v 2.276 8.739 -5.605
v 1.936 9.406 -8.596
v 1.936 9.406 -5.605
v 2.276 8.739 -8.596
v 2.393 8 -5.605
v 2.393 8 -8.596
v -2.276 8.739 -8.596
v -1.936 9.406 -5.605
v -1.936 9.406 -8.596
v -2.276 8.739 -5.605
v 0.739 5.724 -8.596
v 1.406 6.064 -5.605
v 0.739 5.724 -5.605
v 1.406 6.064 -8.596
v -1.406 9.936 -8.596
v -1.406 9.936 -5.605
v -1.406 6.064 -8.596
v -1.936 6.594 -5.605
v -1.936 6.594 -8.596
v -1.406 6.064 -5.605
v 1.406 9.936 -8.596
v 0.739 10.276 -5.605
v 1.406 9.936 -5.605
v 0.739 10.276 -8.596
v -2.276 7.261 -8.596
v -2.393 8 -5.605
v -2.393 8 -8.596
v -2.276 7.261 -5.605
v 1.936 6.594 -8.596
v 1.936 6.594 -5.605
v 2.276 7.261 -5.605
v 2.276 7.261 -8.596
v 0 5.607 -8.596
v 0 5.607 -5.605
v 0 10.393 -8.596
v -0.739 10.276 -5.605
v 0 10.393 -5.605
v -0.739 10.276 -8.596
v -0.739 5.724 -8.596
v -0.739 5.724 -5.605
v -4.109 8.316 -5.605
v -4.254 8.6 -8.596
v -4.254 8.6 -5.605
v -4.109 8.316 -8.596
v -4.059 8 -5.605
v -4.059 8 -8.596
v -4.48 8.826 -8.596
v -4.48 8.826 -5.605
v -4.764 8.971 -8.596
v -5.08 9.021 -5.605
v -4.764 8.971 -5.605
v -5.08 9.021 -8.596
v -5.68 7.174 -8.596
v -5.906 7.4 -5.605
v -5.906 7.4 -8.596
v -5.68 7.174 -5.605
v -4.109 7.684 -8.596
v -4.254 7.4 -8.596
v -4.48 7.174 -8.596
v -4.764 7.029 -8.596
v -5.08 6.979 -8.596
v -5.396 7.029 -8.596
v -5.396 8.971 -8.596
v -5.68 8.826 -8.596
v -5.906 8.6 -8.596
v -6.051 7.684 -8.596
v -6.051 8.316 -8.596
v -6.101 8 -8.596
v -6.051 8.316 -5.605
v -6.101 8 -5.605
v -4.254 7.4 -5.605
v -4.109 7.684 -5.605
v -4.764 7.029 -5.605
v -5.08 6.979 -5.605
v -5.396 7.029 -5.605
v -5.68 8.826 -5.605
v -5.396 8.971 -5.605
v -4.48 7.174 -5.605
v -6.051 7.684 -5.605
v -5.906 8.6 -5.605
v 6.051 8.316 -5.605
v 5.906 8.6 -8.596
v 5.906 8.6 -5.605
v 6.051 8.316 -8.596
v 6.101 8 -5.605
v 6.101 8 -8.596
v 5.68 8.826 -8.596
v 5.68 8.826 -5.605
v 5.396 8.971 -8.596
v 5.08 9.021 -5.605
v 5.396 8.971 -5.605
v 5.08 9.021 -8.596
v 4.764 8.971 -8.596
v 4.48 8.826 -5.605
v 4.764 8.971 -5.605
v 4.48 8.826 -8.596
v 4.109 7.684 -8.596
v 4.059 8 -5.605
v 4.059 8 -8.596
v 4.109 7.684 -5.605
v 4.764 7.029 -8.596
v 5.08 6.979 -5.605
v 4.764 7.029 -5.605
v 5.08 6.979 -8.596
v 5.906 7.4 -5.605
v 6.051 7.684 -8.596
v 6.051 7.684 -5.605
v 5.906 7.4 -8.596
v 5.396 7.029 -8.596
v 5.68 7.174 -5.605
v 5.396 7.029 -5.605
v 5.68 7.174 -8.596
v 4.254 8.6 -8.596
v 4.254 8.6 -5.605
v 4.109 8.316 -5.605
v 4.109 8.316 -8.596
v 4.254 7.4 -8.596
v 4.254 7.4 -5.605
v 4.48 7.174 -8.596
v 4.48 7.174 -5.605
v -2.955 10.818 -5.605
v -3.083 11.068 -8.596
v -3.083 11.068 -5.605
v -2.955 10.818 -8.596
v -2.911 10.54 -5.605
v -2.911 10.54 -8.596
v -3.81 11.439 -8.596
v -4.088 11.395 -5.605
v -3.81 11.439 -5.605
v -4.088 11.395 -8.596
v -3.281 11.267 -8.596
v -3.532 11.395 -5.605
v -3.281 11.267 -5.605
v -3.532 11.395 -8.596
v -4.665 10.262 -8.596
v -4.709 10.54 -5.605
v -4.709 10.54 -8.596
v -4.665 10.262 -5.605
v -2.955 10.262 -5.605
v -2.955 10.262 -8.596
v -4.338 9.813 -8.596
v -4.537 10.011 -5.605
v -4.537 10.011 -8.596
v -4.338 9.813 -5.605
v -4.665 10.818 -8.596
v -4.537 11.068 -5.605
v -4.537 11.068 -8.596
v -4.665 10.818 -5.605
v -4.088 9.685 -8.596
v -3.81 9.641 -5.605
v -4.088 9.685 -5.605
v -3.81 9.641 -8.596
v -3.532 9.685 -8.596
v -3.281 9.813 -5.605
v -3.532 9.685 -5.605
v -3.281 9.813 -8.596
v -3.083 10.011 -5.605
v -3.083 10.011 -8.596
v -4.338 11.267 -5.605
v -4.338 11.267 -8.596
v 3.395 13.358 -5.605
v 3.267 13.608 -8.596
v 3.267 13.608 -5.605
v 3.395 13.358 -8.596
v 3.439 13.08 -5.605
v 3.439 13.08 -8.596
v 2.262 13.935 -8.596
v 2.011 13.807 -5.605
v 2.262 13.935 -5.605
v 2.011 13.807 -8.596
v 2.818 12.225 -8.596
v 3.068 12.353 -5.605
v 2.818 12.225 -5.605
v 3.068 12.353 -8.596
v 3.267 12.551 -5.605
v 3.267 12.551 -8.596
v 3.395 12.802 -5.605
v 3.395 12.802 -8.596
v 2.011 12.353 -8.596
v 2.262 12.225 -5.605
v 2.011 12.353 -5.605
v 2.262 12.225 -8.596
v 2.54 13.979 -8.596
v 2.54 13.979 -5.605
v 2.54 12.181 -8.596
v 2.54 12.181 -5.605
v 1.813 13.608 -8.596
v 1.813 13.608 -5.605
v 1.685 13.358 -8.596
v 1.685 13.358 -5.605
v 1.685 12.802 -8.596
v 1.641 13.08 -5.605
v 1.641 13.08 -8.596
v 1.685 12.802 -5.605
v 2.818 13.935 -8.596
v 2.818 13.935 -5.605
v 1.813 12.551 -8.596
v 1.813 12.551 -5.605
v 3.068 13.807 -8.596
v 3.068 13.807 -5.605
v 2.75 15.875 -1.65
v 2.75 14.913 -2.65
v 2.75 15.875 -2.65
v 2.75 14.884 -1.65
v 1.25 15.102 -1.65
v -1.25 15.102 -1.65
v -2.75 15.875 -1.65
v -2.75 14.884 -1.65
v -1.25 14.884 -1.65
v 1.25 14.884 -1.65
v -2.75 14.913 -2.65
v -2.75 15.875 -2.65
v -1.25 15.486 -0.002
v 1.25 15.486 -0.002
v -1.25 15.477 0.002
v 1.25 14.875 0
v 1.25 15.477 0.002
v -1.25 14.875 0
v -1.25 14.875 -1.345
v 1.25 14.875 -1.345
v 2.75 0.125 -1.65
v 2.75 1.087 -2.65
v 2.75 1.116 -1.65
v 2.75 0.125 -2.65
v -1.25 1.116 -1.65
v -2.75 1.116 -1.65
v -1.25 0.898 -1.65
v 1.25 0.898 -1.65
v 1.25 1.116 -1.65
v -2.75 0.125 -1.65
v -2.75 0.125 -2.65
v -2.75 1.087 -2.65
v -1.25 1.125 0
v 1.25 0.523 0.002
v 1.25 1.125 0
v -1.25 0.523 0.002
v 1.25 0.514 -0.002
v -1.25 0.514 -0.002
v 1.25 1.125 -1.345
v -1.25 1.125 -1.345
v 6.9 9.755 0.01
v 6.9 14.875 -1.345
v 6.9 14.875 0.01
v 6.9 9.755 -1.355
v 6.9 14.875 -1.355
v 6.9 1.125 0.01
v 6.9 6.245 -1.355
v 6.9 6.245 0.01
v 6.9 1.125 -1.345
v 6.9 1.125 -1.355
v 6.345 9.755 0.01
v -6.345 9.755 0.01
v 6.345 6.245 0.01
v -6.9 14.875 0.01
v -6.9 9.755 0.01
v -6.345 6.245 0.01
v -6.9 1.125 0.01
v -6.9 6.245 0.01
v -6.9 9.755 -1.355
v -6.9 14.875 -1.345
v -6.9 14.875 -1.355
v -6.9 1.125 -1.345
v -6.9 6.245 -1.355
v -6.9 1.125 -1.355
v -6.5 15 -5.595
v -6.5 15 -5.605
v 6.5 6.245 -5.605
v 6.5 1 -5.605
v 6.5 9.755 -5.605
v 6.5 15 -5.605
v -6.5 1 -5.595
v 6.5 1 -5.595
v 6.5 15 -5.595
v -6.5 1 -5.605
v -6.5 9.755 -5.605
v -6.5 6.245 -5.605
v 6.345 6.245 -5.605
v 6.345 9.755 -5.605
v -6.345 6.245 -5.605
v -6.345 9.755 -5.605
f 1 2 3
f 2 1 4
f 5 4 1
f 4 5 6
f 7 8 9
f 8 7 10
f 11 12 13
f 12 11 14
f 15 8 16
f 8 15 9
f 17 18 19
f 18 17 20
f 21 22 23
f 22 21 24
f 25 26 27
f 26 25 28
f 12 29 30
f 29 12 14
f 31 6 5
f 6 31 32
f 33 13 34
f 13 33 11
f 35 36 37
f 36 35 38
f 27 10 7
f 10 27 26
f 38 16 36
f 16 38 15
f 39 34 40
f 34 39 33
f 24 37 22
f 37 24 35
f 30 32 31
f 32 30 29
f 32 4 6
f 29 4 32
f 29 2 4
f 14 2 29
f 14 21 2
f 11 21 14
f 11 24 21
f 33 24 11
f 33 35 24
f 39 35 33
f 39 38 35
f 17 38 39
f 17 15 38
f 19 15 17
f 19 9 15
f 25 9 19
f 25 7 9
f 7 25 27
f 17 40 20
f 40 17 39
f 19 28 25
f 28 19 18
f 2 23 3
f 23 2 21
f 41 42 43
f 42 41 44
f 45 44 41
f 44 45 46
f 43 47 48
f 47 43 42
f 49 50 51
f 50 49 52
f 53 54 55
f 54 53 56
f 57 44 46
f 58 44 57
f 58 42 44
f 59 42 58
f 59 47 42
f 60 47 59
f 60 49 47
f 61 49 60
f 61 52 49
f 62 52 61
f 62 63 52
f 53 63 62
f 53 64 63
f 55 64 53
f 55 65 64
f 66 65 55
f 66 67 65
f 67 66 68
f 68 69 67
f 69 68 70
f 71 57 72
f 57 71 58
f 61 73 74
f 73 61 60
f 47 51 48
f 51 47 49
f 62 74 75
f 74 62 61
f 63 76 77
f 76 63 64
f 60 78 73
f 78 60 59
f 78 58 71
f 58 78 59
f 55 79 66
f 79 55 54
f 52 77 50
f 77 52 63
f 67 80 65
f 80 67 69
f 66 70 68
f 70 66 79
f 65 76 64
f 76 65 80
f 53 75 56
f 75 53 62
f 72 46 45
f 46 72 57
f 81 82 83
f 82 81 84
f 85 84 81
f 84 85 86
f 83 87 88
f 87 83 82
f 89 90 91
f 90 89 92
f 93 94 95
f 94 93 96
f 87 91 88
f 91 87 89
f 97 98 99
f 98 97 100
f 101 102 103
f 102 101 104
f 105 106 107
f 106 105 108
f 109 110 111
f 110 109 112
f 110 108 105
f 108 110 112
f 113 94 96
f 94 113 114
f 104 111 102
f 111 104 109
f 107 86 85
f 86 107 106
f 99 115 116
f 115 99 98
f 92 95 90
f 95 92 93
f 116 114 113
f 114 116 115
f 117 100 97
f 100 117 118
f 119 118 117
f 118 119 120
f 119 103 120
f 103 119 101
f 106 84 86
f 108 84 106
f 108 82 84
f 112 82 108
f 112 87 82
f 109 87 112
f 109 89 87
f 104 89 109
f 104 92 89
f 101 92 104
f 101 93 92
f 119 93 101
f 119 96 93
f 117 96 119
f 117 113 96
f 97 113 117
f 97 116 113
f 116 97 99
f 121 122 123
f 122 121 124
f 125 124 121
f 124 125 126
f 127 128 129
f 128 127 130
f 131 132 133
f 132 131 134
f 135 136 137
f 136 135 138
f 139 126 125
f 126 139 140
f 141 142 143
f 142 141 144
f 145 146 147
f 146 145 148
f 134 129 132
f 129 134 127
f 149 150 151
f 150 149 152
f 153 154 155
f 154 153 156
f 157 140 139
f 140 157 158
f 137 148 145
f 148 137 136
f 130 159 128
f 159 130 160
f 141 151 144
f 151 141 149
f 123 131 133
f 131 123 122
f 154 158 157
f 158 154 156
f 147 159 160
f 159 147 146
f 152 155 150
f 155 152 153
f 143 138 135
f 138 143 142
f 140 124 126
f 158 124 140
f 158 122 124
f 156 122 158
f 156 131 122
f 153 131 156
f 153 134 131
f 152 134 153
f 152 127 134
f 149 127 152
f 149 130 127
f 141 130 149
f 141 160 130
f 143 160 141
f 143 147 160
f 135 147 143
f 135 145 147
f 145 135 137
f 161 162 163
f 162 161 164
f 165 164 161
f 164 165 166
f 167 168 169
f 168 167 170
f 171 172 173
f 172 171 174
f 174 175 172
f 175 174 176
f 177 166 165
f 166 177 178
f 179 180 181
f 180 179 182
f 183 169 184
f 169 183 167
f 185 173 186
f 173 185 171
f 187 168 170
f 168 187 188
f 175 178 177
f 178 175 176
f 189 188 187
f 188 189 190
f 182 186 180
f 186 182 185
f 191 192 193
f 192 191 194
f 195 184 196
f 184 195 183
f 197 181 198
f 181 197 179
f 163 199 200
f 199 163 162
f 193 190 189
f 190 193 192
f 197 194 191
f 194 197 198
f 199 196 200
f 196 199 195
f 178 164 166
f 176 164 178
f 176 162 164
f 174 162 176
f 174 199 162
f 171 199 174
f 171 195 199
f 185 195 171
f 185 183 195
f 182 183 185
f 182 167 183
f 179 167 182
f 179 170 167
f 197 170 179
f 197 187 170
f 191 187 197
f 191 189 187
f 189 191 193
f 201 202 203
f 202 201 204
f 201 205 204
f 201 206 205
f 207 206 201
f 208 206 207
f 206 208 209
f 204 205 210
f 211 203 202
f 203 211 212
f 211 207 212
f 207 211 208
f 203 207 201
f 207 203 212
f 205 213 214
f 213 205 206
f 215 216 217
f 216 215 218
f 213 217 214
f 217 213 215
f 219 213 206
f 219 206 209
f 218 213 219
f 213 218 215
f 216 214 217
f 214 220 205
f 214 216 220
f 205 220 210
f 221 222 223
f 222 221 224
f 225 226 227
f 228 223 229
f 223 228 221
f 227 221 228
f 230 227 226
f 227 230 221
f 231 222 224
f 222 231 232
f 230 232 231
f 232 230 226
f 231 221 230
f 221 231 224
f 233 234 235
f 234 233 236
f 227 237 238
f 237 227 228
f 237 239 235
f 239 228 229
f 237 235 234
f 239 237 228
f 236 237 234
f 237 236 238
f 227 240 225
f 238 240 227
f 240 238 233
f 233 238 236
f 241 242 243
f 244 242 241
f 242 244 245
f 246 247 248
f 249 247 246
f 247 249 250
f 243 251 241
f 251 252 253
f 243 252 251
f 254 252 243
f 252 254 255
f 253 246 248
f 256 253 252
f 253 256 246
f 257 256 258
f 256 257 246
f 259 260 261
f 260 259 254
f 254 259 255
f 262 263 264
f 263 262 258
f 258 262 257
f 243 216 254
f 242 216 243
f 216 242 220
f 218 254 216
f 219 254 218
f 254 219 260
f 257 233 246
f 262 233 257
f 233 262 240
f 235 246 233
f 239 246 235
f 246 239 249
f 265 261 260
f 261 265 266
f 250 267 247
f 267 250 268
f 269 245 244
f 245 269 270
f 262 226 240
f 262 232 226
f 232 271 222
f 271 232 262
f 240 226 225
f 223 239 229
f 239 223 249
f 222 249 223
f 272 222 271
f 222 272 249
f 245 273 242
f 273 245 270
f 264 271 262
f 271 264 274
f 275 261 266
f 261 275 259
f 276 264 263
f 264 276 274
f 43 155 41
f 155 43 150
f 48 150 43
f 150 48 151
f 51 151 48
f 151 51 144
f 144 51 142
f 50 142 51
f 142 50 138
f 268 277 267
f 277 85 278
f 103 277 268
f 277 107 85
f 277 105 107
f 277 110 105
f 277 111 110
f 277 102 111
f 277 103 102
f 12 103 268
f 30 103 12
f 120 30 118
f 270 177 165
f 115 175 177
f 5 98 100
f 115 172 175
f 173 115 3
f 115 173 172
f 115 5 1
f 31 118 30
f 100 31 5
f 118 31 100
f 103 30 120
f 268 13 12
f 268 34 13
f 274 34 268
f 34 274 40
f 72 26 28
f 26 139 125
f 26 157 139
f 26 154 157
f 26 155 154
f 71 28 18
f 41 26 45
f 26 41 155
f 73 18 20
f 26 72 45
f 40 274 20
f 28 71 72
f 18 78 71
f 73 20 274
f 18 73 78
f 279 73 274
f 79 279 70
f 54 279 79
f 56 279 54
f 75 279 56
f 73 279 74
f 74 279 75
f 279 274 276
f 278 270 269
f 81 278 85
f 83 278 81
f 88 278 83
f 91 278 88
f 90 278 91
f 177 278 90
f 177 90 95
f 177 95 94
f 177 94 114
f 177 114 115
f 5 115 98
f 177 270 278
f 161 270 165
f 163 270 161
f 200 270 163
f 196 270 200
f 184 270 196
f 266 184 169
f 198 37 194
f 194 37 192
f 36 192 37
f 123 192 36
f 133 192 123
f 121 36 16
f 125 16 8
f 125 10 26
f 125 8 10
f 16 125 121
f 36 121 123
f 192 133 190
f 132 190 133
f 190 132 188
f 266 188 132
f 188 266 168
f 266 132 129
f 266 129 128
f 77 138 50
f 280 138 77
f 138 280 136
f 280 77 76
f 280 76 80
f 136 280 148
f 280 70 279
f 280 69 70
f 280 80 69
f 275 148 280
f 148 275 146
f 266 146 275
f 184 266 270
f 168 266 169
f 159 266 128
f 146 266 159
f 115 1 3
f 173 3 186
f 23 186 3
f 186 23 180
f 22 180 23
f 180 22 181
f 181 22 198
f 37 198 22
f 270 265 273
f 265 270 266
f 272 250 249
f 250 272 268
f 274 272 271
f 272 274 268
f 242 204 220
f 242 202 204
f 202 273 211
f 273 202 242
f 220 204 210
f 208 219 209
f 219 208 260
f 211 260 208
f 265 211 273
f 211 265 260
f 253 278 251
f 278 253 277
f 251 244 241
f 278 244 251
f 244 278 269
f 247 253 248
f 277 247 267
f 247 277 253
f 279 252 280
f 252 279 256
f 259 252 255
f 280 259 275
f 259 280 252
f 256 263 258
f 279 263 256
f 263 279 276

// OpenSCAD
// all units in mm
translate([0,8,0])
cherry_mx_bottom();
*posts_and_wire_cutouts();

diode_holes = false;
LED_holes = false;

total_depth = 5.6; // from the cherry documentation 

top_length_x = 13.8;//13.8;// measured
top_length_y = 13.75;//13.75; // measured
top_length_z = 1.35;// measure me

side_notch_length_x = 0.55; // measured
side_notch_length_y = 3.5; // measured 3.8

bottom_length_x = 13;//12.75;// measured
bottom_length_y = 14;//13.8;// measured

snap_dist_z = 0.5;// measure me
snap_angle = 25; // degrees
snap_tab_width = 2.5;

snap_bar_height = 1;
snap_bar_depth = 1;
snap_bar_length = 5.5;





switch_bottom_color = "DarkGray";



module cherry_mx_bottom(){
    translate([0,0,-top_length_z]){
    difference () {
        
        union (){
            color(switch_bottom_color)
            translate([0,0,top_length_z+0.01]/2){ cube([top_length_x, top_length_y, top_length_z+0.01],center=true);}
            color(switch_bottom_color)
            hull (){
                
                translate([0,0,0]){ // the top of the angled section
                    cube([top_length_x, top_length_y, 0.01],center=true);
                }
                
                
                translate([0,0,-(total_depth-top_length_z)]){ // the bottom of the angled section
                    cube([bottom_length_x, bottom_length_y, 0.01],center=true);
                }
            }
            
            translate([0,0,-total_depth - (2.54*10*post_height - 0.01)/2]){
                posts_and_wire_cutouts();
            }
            color(switch_bottom_color)
            snap_in_tabs();
        }
        color(switch_bottom_color)
        side_cutouts();
        
    }
    }
}
module side_cutouts(){
    translate ([top_length_x/2 -side_notch_length_x/2,0, (top_length_z - total_depth/2)  ]) {
        cube([side_notch_length_x + 0.01,side_notch_length_y + 0.01,total_depth + 0.03],center=true);
    }
    translate ([ -(top_length_x/2 -side_notch_length_x/2),0, (top_length_z - total_depth/2)  ]) {
        cube([side_notch_length_x + 0.01,side_notch_length_y + 0.01,total_depth + 0.03],center=true);
    }
}


module snap_in_tabs(){
    
    s = 2.6;
    
	d = -1.3;
    translate([0,top_length_y/2,snap_dist_z ]){
		translate([0,snap_bar_depth/2,d]){
            cube([snap_bar_length,snap_bar_depth,snap_bar_height],center=true);
        }
        
        
    }
    
	translate([0,top_length_y/2,top_length_z-s/2]){
		hull(){
            cube([snap_tab_width,0.01,s],center=true);
            rotate(-snap_angle,[1,0,0]){
                cube([snap_tab_width,0.01,s/cos(snap_angle)],center=true);
            }
        }
	}
	
	
    translate([0,-top_length_y/2,snap_dist_z ]){
		translate([0,-snap_bar_depth/2,d]){
            cube([snap_bar_length,snap_bar_depth,snap_bar_height],center=true);
        }
        
        
    }
    
	translate([0,-top_length_y/2,top_length_z-s/2]){
		hull(){
            cube([snap_tab_width,0.01,s],center=true);
            rotate(snap_angle,[1,0,0]){
                cube([snap_tab_width,0.01,s/cos(snap_angle)],center=true);
            }
        }
	}
    
    
}

 









post_height = 0.13; // from cherry corp documentation

center_post_diameter = 0.157; // from cherry corp documentation
guide_post_diameter = 0.067; // from cherry corp documentation
pin_diameter = 0.059; // from cherry corp documentation
diode_post_diameter = 0.039; // from cherry corp documentation

guide_post1_x_offset = -0.2; // from cherry corp documentation
guide_post2_x_offset = 0.2; // from cherry corp documentation

pin1_x_offset = -0.15; // from cherry corp documentation
pin1_y_offset = 0.1; // from cherry corp documentation

pin2_x_offset = 0.1; // from cherry corp documentation
pin2_y_offset = 0.2; // from cherry corp documentation


diode1_x_offset = -0.15; // from cherry corp documentation
diode1_y_offset = -0.2; // from cherry corp documentation

diode2_x_offset = 0.15; // from cherry corp documentation
diode2_y_offset = -0.2; // from cherry corp documentation

LED1_x_offset = -0.05; // from cherry corp documentation
LED1_y_offset = -0.2; // from cherry corp documentation

LED2_x_offset = 0.05; // from cherry corp documentation
LED2_y_offset = -0.2; // from cherry corp documentation

printed_size_compensation_factor = 1.2;


// produces a centered above-plane set of cutouts for a cherry mx switch
module posts_and_wire_cutouts(){
    s = 10*2.54;
    scale ([s,s,s]){
        color(switch_bottom_color) {
            translate ([0,0,0]){
                center_post();    
            }
            translate ([guide_post1_x_offset,0,0]){
                guide_post();
            }
            translate ([guide_post2_x_offset,0,0]){
                guide_post();
            }
        }
        color("Gold") {
            translate ([pin1_x_offset,pin1_y_offset,0]){
                pin();
            }
            translate ([pin2_x_offset,pin2_y_offset,0]){
                pin();
            }
			
			if (diode_holes){
				translate ([diode1_x_offset,diode1_y_offset,]){
					diode_lead();
				}
				translate ([diode2_x_offset,diode2_y_offset,]){
					diode_lead();
				}
			}
			
			if (LED_holes){
				translate ([LED1_x_offset,LED1_y_offset,]){
					diode_lead();
				}
				translate ([LED2_x_offset,LED2_y_offset,]){
					diode_lead();
				}
            }
        }
    }
}


module center_post(){
    cylinder(r=center_post_diameter/2*printed_size_compensation_factor, h = 0.13, $fn = 20);
}

module guide_post(){
    cylinder(r=guide_post_diameter/2*printed_size_compensation_factor, h = 0.13, $fn = 20);
}

module pin(){
    cylinder(r=pin_diameter/2*printed_size_compensation_factor, h = 0.13, $fn = 20);
}

module diode_lead(){
    cylinder(r=diode_post_diameter/2*printed_size_compensation_factor, h = 0.13, $fn = 20);
}
